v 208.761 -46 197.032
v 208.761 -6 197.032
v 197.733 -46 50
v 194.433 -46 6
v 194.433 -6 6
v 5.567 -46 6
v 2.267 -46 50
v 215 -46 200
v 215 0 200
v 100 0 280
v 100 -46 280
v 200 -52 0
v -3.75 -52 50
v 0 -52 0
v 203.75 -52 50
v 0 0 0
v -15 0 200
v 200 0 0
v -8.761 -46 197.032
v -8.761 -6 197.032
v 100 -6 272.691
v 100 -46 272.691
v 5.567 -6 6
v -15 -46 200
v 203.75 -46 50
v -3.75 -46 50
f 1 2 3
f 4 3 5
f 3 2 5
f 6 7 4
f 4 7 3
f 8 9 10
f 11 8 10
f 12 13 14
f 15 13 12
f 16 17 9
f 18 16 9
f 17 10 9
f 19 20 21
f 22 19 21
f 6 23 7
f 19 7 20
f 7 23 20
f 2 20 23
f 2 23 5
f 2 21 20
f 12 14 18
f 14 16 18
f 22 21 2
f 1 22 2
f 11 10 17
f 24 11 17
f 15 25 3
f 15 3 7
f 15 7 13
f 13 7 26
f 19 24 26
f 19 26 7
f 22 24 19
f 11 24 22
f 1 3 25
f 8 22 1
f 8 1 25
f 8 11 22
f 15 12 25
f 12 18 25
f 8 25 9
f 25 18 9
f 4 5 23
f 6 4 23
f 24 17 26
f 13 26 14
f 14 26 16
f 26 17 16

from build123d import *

# Parameters (mm, degrees)
F1_DEPTH = 6
F3_DEPTH = 40
F5_DEPTH = 6


with BuildPart() as f1:
    # F0 (on Front) → F1 (new body)
    with BuildSketch(Plane.XZ):
        Polygon((-15, 200), (0, 0), (100, 0), (100, 200), align=None)
        Polygon((100, 200), (100, 0), (200, 0), (215, 200), align=None)
        Polygon((100, 280), (100, 200), (215, 200), align=None)
        Polygon((100, 280), (-15, 200), (100, 200), align=None)
    extrude(amount=F1_DEPTH)

    # F2 (on face) → F3 (join)
    with BuildSketch(Plane.XZ.offset(6)):
        Polygon((100, 280), (-15, 200), (0, 0), (200, 0), (215, 200), align=None)
        Polygon((-8.760511823, 197.0315087877), (100, 272.6909952733), (208.760511823, 197.0315087877), (194.433148664, 6), (5.566851336, 6), align=None, mode=Mode.SUBTRACT)
    extrude(amount=F3_DEPTH)

    # F4 (on face) → F5 (join)
    with BuildSketch(Plane.XZ.offset(46)):
        Polygon((197.733148664, 50), (2.266851336, 50), (5.566851336, 6), (194.433148664, 6), align=None)
        Polygon((2.266851336, 50), (-3.75, 50), (0, 0), (200, 0), (203.75, 50), (197.733148664, 50), (194.433148664, 6), (5.566851336, 6), align=None)
    extrude(amount=F5_DEPTH)


solid = f1.part
